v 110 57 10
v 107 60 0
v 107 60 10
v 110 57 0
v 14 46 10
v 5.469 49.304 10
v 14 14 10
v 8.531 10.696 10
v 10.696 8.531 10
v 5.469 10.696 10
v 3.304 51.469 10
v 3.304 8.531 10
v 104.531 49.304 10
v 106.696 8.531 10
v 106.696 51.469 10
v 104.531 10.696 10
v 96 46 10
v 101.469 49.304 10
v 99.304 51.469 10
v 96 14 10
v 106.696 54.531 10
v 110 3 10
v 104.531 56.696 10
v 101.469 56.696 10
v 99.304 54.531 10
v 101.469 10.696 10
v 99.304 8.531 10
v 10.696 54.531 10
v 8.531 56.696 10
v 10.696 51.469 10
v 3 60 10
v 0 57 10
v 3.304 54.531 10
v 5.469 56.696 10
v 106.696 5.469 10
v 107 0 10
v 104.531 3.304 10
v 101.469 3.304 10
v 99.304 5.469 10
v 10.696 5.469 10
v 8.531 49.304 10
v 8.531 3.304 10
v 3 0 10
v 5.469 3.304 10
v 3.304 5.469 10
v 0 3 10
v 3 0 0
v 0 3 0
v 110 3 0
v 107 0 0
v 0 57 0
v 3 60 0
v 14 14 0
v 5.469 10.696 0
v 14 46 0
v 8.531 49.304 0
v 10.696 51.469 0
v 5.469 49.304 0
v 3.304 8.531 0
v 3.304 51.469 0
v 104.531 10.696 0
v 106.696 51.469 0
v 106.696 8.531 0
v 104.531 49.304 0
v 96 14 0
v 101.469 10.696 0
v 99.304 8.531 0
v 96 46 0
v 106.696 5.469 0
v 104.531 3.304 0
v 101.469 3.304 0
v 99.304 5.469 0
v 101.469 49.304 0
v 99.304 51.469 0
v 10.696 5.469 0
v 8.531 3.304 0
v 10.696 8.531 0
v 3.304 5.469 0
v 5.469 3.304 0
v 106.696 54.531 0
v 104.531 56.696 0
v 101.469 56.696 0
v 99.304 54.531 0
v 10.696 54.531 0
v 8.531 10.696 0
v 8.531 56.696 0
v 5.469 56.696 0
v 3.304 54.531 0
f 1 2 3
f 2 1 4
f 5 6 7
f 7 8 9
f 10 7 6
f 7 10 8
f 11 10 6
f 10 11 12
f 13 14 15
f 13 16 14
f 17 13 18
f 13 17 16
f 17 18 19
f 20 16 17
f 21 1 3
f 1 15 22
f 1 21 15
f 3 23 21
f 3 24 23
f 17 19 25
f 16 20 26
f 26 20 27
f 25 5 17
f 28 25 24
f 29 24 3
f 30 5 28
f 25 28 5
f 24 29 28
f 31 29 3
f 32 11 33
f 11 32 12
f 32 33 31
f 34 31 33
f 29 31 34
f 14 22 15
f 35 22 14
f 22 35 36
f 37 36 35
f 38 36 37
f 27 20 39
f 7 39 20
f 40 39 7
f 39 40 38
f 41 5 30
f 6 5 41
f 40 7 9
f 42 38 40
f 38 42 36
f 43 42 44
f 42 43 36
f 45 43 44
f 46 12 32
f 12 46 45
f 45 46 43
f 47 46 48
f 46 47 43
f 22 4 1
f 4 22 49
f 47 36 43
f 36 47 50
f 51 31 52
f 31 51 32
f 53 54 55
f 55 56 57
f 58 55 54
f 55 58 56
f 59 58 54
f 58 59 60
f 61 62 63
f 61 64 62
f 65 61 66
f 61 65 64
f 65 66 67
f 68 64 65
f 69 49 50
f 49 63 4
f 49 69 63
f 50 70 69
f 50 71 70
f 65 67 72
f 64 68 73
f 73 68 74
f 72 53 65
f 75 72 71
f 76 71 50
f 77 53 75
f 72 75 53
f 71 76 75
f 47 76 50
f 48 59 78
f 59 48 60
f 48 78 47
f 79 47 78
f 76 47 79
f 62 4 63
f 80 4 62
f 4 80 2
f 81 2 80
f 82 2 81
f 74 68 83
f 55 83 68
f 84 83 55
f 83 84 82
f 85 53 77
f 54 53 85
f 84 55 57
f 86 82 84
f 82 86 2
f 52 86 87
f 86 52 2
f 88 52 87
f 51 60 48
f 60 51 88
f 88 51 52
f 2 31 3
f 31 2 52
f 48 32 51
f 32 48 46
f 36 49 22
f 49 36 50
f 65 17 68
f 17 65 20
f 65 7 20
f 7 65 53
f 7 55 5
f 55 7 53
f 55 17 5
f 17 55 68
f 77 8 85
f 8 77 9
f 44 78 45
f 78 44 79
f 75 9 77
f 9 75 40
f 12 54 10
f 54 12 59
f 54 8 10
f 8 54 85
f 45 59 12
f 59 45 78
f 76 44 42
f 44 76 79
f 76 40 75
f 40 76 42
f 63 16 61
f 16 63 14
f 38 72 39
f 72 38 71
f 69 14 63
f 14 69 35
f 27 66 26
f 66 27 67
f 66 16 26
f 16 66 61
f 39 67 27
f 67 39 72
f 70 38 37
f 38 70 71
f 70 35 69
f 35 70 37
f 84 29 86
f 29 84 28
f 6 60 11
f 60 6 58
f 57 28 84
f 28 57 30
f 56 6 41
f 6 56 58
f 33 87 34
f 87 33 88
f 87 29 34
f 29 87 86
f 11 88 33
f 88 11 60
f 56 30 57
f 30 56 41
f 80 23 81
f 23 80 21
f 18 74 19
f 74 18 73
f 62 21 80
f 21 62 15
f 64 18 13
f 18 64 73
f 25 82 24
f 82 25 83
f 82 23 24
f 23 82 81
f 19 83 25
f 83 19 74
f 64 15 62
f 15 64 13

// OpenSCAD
$fn = 32;

// ----------------------------------------------------------------------
// Frame plate: 110 x 60 frame, 14 mm rails
// ----------------------------------------------------------------------

// --- parameters (mm) ---
plate_l = 110;            // plate length, X
plate_w = 60;             // plate width, Y
plate_t = 10;             // plate thickness, Z (extrusion height)
corner_c = 3;             // corner chamfer
frame_bar = 14;           // frame rail width
bolt_r = 4;               // corner bolt window radius
bolt_inset = 7;           // bolt centre inset from the edges

win_l = plate_l - 2 * frame_bar;  // window length
win_w = plate_w - 2 * frame_bar;  // window width
bolt_d = 2 * bolt_r;  // corner hole diameter

profile = [[3, 0], [107, 0], [110, 3], [110, 57], [107, 60], [3, 60], [0, 57], [0, 3]];  // primary outline, 8 points, counter clockwise
void_1 = [[14, 14], [96, 14], [96, 46], [14, 46]];  // the window, 4 points
void_2 = [[10.696, 8.531], [8.531, 10.696], [5.469, 10.696], [3.304, 8.531], [3.304, 5.469], [5.469, 3.304], [8.531, 3.304], [10.696, 5.469]];  // corner bolt window, 8 points
void_3 = [[106.696, 8.531], [104.531, 10.696], [101.469, 10.696], [99.304, 8.531], [99.304, 5.469], [101.469, 3.304], [104.531, 3.304], [106.696, 5.469]];  // corner bolt window, 8 points
void_4 = [[10.696, 54.531], [8.531, 56.696], [5.469, 56.696], [3.304, 54.531], [3.304, 51.469], [5.469, 49.304], [8.531, 49.304], [10.696, 51.469]];  // corner bolt window, 8 points
void_5 = [[106.696, 54.531], [104.531, 56.696], [101.469, 56.696], [99.304, 54.531], [99.304, 51.469], [101.469, 49.304], [104.531, 49.304], [106.696, 51.469]];  // corner bolt window, 8 points

// --- the one profile operation ---
difference() {
  linear_extrude(height = plate_t) polygon(points = profile);
  translate([0, 0, -1])
    linear_extrude(height = plate_t + 2) polygon(points = void_1);
  translate([0, 0, -1])
    linear_extrude(height = plate_t + 2) polygon(points = void_2);
  translate([0, 0, -1])
    linear_extrude(height = plate_t + 2) polygon(points = void_3);
  translate([0, 0, -1])
    linear_extrude(height = plate_t + 2) polygon(points = void_4);
  translate([0, 0, -1])
    linear_extrude(height = plate_t + 2) polygon(points = void_5);
}
